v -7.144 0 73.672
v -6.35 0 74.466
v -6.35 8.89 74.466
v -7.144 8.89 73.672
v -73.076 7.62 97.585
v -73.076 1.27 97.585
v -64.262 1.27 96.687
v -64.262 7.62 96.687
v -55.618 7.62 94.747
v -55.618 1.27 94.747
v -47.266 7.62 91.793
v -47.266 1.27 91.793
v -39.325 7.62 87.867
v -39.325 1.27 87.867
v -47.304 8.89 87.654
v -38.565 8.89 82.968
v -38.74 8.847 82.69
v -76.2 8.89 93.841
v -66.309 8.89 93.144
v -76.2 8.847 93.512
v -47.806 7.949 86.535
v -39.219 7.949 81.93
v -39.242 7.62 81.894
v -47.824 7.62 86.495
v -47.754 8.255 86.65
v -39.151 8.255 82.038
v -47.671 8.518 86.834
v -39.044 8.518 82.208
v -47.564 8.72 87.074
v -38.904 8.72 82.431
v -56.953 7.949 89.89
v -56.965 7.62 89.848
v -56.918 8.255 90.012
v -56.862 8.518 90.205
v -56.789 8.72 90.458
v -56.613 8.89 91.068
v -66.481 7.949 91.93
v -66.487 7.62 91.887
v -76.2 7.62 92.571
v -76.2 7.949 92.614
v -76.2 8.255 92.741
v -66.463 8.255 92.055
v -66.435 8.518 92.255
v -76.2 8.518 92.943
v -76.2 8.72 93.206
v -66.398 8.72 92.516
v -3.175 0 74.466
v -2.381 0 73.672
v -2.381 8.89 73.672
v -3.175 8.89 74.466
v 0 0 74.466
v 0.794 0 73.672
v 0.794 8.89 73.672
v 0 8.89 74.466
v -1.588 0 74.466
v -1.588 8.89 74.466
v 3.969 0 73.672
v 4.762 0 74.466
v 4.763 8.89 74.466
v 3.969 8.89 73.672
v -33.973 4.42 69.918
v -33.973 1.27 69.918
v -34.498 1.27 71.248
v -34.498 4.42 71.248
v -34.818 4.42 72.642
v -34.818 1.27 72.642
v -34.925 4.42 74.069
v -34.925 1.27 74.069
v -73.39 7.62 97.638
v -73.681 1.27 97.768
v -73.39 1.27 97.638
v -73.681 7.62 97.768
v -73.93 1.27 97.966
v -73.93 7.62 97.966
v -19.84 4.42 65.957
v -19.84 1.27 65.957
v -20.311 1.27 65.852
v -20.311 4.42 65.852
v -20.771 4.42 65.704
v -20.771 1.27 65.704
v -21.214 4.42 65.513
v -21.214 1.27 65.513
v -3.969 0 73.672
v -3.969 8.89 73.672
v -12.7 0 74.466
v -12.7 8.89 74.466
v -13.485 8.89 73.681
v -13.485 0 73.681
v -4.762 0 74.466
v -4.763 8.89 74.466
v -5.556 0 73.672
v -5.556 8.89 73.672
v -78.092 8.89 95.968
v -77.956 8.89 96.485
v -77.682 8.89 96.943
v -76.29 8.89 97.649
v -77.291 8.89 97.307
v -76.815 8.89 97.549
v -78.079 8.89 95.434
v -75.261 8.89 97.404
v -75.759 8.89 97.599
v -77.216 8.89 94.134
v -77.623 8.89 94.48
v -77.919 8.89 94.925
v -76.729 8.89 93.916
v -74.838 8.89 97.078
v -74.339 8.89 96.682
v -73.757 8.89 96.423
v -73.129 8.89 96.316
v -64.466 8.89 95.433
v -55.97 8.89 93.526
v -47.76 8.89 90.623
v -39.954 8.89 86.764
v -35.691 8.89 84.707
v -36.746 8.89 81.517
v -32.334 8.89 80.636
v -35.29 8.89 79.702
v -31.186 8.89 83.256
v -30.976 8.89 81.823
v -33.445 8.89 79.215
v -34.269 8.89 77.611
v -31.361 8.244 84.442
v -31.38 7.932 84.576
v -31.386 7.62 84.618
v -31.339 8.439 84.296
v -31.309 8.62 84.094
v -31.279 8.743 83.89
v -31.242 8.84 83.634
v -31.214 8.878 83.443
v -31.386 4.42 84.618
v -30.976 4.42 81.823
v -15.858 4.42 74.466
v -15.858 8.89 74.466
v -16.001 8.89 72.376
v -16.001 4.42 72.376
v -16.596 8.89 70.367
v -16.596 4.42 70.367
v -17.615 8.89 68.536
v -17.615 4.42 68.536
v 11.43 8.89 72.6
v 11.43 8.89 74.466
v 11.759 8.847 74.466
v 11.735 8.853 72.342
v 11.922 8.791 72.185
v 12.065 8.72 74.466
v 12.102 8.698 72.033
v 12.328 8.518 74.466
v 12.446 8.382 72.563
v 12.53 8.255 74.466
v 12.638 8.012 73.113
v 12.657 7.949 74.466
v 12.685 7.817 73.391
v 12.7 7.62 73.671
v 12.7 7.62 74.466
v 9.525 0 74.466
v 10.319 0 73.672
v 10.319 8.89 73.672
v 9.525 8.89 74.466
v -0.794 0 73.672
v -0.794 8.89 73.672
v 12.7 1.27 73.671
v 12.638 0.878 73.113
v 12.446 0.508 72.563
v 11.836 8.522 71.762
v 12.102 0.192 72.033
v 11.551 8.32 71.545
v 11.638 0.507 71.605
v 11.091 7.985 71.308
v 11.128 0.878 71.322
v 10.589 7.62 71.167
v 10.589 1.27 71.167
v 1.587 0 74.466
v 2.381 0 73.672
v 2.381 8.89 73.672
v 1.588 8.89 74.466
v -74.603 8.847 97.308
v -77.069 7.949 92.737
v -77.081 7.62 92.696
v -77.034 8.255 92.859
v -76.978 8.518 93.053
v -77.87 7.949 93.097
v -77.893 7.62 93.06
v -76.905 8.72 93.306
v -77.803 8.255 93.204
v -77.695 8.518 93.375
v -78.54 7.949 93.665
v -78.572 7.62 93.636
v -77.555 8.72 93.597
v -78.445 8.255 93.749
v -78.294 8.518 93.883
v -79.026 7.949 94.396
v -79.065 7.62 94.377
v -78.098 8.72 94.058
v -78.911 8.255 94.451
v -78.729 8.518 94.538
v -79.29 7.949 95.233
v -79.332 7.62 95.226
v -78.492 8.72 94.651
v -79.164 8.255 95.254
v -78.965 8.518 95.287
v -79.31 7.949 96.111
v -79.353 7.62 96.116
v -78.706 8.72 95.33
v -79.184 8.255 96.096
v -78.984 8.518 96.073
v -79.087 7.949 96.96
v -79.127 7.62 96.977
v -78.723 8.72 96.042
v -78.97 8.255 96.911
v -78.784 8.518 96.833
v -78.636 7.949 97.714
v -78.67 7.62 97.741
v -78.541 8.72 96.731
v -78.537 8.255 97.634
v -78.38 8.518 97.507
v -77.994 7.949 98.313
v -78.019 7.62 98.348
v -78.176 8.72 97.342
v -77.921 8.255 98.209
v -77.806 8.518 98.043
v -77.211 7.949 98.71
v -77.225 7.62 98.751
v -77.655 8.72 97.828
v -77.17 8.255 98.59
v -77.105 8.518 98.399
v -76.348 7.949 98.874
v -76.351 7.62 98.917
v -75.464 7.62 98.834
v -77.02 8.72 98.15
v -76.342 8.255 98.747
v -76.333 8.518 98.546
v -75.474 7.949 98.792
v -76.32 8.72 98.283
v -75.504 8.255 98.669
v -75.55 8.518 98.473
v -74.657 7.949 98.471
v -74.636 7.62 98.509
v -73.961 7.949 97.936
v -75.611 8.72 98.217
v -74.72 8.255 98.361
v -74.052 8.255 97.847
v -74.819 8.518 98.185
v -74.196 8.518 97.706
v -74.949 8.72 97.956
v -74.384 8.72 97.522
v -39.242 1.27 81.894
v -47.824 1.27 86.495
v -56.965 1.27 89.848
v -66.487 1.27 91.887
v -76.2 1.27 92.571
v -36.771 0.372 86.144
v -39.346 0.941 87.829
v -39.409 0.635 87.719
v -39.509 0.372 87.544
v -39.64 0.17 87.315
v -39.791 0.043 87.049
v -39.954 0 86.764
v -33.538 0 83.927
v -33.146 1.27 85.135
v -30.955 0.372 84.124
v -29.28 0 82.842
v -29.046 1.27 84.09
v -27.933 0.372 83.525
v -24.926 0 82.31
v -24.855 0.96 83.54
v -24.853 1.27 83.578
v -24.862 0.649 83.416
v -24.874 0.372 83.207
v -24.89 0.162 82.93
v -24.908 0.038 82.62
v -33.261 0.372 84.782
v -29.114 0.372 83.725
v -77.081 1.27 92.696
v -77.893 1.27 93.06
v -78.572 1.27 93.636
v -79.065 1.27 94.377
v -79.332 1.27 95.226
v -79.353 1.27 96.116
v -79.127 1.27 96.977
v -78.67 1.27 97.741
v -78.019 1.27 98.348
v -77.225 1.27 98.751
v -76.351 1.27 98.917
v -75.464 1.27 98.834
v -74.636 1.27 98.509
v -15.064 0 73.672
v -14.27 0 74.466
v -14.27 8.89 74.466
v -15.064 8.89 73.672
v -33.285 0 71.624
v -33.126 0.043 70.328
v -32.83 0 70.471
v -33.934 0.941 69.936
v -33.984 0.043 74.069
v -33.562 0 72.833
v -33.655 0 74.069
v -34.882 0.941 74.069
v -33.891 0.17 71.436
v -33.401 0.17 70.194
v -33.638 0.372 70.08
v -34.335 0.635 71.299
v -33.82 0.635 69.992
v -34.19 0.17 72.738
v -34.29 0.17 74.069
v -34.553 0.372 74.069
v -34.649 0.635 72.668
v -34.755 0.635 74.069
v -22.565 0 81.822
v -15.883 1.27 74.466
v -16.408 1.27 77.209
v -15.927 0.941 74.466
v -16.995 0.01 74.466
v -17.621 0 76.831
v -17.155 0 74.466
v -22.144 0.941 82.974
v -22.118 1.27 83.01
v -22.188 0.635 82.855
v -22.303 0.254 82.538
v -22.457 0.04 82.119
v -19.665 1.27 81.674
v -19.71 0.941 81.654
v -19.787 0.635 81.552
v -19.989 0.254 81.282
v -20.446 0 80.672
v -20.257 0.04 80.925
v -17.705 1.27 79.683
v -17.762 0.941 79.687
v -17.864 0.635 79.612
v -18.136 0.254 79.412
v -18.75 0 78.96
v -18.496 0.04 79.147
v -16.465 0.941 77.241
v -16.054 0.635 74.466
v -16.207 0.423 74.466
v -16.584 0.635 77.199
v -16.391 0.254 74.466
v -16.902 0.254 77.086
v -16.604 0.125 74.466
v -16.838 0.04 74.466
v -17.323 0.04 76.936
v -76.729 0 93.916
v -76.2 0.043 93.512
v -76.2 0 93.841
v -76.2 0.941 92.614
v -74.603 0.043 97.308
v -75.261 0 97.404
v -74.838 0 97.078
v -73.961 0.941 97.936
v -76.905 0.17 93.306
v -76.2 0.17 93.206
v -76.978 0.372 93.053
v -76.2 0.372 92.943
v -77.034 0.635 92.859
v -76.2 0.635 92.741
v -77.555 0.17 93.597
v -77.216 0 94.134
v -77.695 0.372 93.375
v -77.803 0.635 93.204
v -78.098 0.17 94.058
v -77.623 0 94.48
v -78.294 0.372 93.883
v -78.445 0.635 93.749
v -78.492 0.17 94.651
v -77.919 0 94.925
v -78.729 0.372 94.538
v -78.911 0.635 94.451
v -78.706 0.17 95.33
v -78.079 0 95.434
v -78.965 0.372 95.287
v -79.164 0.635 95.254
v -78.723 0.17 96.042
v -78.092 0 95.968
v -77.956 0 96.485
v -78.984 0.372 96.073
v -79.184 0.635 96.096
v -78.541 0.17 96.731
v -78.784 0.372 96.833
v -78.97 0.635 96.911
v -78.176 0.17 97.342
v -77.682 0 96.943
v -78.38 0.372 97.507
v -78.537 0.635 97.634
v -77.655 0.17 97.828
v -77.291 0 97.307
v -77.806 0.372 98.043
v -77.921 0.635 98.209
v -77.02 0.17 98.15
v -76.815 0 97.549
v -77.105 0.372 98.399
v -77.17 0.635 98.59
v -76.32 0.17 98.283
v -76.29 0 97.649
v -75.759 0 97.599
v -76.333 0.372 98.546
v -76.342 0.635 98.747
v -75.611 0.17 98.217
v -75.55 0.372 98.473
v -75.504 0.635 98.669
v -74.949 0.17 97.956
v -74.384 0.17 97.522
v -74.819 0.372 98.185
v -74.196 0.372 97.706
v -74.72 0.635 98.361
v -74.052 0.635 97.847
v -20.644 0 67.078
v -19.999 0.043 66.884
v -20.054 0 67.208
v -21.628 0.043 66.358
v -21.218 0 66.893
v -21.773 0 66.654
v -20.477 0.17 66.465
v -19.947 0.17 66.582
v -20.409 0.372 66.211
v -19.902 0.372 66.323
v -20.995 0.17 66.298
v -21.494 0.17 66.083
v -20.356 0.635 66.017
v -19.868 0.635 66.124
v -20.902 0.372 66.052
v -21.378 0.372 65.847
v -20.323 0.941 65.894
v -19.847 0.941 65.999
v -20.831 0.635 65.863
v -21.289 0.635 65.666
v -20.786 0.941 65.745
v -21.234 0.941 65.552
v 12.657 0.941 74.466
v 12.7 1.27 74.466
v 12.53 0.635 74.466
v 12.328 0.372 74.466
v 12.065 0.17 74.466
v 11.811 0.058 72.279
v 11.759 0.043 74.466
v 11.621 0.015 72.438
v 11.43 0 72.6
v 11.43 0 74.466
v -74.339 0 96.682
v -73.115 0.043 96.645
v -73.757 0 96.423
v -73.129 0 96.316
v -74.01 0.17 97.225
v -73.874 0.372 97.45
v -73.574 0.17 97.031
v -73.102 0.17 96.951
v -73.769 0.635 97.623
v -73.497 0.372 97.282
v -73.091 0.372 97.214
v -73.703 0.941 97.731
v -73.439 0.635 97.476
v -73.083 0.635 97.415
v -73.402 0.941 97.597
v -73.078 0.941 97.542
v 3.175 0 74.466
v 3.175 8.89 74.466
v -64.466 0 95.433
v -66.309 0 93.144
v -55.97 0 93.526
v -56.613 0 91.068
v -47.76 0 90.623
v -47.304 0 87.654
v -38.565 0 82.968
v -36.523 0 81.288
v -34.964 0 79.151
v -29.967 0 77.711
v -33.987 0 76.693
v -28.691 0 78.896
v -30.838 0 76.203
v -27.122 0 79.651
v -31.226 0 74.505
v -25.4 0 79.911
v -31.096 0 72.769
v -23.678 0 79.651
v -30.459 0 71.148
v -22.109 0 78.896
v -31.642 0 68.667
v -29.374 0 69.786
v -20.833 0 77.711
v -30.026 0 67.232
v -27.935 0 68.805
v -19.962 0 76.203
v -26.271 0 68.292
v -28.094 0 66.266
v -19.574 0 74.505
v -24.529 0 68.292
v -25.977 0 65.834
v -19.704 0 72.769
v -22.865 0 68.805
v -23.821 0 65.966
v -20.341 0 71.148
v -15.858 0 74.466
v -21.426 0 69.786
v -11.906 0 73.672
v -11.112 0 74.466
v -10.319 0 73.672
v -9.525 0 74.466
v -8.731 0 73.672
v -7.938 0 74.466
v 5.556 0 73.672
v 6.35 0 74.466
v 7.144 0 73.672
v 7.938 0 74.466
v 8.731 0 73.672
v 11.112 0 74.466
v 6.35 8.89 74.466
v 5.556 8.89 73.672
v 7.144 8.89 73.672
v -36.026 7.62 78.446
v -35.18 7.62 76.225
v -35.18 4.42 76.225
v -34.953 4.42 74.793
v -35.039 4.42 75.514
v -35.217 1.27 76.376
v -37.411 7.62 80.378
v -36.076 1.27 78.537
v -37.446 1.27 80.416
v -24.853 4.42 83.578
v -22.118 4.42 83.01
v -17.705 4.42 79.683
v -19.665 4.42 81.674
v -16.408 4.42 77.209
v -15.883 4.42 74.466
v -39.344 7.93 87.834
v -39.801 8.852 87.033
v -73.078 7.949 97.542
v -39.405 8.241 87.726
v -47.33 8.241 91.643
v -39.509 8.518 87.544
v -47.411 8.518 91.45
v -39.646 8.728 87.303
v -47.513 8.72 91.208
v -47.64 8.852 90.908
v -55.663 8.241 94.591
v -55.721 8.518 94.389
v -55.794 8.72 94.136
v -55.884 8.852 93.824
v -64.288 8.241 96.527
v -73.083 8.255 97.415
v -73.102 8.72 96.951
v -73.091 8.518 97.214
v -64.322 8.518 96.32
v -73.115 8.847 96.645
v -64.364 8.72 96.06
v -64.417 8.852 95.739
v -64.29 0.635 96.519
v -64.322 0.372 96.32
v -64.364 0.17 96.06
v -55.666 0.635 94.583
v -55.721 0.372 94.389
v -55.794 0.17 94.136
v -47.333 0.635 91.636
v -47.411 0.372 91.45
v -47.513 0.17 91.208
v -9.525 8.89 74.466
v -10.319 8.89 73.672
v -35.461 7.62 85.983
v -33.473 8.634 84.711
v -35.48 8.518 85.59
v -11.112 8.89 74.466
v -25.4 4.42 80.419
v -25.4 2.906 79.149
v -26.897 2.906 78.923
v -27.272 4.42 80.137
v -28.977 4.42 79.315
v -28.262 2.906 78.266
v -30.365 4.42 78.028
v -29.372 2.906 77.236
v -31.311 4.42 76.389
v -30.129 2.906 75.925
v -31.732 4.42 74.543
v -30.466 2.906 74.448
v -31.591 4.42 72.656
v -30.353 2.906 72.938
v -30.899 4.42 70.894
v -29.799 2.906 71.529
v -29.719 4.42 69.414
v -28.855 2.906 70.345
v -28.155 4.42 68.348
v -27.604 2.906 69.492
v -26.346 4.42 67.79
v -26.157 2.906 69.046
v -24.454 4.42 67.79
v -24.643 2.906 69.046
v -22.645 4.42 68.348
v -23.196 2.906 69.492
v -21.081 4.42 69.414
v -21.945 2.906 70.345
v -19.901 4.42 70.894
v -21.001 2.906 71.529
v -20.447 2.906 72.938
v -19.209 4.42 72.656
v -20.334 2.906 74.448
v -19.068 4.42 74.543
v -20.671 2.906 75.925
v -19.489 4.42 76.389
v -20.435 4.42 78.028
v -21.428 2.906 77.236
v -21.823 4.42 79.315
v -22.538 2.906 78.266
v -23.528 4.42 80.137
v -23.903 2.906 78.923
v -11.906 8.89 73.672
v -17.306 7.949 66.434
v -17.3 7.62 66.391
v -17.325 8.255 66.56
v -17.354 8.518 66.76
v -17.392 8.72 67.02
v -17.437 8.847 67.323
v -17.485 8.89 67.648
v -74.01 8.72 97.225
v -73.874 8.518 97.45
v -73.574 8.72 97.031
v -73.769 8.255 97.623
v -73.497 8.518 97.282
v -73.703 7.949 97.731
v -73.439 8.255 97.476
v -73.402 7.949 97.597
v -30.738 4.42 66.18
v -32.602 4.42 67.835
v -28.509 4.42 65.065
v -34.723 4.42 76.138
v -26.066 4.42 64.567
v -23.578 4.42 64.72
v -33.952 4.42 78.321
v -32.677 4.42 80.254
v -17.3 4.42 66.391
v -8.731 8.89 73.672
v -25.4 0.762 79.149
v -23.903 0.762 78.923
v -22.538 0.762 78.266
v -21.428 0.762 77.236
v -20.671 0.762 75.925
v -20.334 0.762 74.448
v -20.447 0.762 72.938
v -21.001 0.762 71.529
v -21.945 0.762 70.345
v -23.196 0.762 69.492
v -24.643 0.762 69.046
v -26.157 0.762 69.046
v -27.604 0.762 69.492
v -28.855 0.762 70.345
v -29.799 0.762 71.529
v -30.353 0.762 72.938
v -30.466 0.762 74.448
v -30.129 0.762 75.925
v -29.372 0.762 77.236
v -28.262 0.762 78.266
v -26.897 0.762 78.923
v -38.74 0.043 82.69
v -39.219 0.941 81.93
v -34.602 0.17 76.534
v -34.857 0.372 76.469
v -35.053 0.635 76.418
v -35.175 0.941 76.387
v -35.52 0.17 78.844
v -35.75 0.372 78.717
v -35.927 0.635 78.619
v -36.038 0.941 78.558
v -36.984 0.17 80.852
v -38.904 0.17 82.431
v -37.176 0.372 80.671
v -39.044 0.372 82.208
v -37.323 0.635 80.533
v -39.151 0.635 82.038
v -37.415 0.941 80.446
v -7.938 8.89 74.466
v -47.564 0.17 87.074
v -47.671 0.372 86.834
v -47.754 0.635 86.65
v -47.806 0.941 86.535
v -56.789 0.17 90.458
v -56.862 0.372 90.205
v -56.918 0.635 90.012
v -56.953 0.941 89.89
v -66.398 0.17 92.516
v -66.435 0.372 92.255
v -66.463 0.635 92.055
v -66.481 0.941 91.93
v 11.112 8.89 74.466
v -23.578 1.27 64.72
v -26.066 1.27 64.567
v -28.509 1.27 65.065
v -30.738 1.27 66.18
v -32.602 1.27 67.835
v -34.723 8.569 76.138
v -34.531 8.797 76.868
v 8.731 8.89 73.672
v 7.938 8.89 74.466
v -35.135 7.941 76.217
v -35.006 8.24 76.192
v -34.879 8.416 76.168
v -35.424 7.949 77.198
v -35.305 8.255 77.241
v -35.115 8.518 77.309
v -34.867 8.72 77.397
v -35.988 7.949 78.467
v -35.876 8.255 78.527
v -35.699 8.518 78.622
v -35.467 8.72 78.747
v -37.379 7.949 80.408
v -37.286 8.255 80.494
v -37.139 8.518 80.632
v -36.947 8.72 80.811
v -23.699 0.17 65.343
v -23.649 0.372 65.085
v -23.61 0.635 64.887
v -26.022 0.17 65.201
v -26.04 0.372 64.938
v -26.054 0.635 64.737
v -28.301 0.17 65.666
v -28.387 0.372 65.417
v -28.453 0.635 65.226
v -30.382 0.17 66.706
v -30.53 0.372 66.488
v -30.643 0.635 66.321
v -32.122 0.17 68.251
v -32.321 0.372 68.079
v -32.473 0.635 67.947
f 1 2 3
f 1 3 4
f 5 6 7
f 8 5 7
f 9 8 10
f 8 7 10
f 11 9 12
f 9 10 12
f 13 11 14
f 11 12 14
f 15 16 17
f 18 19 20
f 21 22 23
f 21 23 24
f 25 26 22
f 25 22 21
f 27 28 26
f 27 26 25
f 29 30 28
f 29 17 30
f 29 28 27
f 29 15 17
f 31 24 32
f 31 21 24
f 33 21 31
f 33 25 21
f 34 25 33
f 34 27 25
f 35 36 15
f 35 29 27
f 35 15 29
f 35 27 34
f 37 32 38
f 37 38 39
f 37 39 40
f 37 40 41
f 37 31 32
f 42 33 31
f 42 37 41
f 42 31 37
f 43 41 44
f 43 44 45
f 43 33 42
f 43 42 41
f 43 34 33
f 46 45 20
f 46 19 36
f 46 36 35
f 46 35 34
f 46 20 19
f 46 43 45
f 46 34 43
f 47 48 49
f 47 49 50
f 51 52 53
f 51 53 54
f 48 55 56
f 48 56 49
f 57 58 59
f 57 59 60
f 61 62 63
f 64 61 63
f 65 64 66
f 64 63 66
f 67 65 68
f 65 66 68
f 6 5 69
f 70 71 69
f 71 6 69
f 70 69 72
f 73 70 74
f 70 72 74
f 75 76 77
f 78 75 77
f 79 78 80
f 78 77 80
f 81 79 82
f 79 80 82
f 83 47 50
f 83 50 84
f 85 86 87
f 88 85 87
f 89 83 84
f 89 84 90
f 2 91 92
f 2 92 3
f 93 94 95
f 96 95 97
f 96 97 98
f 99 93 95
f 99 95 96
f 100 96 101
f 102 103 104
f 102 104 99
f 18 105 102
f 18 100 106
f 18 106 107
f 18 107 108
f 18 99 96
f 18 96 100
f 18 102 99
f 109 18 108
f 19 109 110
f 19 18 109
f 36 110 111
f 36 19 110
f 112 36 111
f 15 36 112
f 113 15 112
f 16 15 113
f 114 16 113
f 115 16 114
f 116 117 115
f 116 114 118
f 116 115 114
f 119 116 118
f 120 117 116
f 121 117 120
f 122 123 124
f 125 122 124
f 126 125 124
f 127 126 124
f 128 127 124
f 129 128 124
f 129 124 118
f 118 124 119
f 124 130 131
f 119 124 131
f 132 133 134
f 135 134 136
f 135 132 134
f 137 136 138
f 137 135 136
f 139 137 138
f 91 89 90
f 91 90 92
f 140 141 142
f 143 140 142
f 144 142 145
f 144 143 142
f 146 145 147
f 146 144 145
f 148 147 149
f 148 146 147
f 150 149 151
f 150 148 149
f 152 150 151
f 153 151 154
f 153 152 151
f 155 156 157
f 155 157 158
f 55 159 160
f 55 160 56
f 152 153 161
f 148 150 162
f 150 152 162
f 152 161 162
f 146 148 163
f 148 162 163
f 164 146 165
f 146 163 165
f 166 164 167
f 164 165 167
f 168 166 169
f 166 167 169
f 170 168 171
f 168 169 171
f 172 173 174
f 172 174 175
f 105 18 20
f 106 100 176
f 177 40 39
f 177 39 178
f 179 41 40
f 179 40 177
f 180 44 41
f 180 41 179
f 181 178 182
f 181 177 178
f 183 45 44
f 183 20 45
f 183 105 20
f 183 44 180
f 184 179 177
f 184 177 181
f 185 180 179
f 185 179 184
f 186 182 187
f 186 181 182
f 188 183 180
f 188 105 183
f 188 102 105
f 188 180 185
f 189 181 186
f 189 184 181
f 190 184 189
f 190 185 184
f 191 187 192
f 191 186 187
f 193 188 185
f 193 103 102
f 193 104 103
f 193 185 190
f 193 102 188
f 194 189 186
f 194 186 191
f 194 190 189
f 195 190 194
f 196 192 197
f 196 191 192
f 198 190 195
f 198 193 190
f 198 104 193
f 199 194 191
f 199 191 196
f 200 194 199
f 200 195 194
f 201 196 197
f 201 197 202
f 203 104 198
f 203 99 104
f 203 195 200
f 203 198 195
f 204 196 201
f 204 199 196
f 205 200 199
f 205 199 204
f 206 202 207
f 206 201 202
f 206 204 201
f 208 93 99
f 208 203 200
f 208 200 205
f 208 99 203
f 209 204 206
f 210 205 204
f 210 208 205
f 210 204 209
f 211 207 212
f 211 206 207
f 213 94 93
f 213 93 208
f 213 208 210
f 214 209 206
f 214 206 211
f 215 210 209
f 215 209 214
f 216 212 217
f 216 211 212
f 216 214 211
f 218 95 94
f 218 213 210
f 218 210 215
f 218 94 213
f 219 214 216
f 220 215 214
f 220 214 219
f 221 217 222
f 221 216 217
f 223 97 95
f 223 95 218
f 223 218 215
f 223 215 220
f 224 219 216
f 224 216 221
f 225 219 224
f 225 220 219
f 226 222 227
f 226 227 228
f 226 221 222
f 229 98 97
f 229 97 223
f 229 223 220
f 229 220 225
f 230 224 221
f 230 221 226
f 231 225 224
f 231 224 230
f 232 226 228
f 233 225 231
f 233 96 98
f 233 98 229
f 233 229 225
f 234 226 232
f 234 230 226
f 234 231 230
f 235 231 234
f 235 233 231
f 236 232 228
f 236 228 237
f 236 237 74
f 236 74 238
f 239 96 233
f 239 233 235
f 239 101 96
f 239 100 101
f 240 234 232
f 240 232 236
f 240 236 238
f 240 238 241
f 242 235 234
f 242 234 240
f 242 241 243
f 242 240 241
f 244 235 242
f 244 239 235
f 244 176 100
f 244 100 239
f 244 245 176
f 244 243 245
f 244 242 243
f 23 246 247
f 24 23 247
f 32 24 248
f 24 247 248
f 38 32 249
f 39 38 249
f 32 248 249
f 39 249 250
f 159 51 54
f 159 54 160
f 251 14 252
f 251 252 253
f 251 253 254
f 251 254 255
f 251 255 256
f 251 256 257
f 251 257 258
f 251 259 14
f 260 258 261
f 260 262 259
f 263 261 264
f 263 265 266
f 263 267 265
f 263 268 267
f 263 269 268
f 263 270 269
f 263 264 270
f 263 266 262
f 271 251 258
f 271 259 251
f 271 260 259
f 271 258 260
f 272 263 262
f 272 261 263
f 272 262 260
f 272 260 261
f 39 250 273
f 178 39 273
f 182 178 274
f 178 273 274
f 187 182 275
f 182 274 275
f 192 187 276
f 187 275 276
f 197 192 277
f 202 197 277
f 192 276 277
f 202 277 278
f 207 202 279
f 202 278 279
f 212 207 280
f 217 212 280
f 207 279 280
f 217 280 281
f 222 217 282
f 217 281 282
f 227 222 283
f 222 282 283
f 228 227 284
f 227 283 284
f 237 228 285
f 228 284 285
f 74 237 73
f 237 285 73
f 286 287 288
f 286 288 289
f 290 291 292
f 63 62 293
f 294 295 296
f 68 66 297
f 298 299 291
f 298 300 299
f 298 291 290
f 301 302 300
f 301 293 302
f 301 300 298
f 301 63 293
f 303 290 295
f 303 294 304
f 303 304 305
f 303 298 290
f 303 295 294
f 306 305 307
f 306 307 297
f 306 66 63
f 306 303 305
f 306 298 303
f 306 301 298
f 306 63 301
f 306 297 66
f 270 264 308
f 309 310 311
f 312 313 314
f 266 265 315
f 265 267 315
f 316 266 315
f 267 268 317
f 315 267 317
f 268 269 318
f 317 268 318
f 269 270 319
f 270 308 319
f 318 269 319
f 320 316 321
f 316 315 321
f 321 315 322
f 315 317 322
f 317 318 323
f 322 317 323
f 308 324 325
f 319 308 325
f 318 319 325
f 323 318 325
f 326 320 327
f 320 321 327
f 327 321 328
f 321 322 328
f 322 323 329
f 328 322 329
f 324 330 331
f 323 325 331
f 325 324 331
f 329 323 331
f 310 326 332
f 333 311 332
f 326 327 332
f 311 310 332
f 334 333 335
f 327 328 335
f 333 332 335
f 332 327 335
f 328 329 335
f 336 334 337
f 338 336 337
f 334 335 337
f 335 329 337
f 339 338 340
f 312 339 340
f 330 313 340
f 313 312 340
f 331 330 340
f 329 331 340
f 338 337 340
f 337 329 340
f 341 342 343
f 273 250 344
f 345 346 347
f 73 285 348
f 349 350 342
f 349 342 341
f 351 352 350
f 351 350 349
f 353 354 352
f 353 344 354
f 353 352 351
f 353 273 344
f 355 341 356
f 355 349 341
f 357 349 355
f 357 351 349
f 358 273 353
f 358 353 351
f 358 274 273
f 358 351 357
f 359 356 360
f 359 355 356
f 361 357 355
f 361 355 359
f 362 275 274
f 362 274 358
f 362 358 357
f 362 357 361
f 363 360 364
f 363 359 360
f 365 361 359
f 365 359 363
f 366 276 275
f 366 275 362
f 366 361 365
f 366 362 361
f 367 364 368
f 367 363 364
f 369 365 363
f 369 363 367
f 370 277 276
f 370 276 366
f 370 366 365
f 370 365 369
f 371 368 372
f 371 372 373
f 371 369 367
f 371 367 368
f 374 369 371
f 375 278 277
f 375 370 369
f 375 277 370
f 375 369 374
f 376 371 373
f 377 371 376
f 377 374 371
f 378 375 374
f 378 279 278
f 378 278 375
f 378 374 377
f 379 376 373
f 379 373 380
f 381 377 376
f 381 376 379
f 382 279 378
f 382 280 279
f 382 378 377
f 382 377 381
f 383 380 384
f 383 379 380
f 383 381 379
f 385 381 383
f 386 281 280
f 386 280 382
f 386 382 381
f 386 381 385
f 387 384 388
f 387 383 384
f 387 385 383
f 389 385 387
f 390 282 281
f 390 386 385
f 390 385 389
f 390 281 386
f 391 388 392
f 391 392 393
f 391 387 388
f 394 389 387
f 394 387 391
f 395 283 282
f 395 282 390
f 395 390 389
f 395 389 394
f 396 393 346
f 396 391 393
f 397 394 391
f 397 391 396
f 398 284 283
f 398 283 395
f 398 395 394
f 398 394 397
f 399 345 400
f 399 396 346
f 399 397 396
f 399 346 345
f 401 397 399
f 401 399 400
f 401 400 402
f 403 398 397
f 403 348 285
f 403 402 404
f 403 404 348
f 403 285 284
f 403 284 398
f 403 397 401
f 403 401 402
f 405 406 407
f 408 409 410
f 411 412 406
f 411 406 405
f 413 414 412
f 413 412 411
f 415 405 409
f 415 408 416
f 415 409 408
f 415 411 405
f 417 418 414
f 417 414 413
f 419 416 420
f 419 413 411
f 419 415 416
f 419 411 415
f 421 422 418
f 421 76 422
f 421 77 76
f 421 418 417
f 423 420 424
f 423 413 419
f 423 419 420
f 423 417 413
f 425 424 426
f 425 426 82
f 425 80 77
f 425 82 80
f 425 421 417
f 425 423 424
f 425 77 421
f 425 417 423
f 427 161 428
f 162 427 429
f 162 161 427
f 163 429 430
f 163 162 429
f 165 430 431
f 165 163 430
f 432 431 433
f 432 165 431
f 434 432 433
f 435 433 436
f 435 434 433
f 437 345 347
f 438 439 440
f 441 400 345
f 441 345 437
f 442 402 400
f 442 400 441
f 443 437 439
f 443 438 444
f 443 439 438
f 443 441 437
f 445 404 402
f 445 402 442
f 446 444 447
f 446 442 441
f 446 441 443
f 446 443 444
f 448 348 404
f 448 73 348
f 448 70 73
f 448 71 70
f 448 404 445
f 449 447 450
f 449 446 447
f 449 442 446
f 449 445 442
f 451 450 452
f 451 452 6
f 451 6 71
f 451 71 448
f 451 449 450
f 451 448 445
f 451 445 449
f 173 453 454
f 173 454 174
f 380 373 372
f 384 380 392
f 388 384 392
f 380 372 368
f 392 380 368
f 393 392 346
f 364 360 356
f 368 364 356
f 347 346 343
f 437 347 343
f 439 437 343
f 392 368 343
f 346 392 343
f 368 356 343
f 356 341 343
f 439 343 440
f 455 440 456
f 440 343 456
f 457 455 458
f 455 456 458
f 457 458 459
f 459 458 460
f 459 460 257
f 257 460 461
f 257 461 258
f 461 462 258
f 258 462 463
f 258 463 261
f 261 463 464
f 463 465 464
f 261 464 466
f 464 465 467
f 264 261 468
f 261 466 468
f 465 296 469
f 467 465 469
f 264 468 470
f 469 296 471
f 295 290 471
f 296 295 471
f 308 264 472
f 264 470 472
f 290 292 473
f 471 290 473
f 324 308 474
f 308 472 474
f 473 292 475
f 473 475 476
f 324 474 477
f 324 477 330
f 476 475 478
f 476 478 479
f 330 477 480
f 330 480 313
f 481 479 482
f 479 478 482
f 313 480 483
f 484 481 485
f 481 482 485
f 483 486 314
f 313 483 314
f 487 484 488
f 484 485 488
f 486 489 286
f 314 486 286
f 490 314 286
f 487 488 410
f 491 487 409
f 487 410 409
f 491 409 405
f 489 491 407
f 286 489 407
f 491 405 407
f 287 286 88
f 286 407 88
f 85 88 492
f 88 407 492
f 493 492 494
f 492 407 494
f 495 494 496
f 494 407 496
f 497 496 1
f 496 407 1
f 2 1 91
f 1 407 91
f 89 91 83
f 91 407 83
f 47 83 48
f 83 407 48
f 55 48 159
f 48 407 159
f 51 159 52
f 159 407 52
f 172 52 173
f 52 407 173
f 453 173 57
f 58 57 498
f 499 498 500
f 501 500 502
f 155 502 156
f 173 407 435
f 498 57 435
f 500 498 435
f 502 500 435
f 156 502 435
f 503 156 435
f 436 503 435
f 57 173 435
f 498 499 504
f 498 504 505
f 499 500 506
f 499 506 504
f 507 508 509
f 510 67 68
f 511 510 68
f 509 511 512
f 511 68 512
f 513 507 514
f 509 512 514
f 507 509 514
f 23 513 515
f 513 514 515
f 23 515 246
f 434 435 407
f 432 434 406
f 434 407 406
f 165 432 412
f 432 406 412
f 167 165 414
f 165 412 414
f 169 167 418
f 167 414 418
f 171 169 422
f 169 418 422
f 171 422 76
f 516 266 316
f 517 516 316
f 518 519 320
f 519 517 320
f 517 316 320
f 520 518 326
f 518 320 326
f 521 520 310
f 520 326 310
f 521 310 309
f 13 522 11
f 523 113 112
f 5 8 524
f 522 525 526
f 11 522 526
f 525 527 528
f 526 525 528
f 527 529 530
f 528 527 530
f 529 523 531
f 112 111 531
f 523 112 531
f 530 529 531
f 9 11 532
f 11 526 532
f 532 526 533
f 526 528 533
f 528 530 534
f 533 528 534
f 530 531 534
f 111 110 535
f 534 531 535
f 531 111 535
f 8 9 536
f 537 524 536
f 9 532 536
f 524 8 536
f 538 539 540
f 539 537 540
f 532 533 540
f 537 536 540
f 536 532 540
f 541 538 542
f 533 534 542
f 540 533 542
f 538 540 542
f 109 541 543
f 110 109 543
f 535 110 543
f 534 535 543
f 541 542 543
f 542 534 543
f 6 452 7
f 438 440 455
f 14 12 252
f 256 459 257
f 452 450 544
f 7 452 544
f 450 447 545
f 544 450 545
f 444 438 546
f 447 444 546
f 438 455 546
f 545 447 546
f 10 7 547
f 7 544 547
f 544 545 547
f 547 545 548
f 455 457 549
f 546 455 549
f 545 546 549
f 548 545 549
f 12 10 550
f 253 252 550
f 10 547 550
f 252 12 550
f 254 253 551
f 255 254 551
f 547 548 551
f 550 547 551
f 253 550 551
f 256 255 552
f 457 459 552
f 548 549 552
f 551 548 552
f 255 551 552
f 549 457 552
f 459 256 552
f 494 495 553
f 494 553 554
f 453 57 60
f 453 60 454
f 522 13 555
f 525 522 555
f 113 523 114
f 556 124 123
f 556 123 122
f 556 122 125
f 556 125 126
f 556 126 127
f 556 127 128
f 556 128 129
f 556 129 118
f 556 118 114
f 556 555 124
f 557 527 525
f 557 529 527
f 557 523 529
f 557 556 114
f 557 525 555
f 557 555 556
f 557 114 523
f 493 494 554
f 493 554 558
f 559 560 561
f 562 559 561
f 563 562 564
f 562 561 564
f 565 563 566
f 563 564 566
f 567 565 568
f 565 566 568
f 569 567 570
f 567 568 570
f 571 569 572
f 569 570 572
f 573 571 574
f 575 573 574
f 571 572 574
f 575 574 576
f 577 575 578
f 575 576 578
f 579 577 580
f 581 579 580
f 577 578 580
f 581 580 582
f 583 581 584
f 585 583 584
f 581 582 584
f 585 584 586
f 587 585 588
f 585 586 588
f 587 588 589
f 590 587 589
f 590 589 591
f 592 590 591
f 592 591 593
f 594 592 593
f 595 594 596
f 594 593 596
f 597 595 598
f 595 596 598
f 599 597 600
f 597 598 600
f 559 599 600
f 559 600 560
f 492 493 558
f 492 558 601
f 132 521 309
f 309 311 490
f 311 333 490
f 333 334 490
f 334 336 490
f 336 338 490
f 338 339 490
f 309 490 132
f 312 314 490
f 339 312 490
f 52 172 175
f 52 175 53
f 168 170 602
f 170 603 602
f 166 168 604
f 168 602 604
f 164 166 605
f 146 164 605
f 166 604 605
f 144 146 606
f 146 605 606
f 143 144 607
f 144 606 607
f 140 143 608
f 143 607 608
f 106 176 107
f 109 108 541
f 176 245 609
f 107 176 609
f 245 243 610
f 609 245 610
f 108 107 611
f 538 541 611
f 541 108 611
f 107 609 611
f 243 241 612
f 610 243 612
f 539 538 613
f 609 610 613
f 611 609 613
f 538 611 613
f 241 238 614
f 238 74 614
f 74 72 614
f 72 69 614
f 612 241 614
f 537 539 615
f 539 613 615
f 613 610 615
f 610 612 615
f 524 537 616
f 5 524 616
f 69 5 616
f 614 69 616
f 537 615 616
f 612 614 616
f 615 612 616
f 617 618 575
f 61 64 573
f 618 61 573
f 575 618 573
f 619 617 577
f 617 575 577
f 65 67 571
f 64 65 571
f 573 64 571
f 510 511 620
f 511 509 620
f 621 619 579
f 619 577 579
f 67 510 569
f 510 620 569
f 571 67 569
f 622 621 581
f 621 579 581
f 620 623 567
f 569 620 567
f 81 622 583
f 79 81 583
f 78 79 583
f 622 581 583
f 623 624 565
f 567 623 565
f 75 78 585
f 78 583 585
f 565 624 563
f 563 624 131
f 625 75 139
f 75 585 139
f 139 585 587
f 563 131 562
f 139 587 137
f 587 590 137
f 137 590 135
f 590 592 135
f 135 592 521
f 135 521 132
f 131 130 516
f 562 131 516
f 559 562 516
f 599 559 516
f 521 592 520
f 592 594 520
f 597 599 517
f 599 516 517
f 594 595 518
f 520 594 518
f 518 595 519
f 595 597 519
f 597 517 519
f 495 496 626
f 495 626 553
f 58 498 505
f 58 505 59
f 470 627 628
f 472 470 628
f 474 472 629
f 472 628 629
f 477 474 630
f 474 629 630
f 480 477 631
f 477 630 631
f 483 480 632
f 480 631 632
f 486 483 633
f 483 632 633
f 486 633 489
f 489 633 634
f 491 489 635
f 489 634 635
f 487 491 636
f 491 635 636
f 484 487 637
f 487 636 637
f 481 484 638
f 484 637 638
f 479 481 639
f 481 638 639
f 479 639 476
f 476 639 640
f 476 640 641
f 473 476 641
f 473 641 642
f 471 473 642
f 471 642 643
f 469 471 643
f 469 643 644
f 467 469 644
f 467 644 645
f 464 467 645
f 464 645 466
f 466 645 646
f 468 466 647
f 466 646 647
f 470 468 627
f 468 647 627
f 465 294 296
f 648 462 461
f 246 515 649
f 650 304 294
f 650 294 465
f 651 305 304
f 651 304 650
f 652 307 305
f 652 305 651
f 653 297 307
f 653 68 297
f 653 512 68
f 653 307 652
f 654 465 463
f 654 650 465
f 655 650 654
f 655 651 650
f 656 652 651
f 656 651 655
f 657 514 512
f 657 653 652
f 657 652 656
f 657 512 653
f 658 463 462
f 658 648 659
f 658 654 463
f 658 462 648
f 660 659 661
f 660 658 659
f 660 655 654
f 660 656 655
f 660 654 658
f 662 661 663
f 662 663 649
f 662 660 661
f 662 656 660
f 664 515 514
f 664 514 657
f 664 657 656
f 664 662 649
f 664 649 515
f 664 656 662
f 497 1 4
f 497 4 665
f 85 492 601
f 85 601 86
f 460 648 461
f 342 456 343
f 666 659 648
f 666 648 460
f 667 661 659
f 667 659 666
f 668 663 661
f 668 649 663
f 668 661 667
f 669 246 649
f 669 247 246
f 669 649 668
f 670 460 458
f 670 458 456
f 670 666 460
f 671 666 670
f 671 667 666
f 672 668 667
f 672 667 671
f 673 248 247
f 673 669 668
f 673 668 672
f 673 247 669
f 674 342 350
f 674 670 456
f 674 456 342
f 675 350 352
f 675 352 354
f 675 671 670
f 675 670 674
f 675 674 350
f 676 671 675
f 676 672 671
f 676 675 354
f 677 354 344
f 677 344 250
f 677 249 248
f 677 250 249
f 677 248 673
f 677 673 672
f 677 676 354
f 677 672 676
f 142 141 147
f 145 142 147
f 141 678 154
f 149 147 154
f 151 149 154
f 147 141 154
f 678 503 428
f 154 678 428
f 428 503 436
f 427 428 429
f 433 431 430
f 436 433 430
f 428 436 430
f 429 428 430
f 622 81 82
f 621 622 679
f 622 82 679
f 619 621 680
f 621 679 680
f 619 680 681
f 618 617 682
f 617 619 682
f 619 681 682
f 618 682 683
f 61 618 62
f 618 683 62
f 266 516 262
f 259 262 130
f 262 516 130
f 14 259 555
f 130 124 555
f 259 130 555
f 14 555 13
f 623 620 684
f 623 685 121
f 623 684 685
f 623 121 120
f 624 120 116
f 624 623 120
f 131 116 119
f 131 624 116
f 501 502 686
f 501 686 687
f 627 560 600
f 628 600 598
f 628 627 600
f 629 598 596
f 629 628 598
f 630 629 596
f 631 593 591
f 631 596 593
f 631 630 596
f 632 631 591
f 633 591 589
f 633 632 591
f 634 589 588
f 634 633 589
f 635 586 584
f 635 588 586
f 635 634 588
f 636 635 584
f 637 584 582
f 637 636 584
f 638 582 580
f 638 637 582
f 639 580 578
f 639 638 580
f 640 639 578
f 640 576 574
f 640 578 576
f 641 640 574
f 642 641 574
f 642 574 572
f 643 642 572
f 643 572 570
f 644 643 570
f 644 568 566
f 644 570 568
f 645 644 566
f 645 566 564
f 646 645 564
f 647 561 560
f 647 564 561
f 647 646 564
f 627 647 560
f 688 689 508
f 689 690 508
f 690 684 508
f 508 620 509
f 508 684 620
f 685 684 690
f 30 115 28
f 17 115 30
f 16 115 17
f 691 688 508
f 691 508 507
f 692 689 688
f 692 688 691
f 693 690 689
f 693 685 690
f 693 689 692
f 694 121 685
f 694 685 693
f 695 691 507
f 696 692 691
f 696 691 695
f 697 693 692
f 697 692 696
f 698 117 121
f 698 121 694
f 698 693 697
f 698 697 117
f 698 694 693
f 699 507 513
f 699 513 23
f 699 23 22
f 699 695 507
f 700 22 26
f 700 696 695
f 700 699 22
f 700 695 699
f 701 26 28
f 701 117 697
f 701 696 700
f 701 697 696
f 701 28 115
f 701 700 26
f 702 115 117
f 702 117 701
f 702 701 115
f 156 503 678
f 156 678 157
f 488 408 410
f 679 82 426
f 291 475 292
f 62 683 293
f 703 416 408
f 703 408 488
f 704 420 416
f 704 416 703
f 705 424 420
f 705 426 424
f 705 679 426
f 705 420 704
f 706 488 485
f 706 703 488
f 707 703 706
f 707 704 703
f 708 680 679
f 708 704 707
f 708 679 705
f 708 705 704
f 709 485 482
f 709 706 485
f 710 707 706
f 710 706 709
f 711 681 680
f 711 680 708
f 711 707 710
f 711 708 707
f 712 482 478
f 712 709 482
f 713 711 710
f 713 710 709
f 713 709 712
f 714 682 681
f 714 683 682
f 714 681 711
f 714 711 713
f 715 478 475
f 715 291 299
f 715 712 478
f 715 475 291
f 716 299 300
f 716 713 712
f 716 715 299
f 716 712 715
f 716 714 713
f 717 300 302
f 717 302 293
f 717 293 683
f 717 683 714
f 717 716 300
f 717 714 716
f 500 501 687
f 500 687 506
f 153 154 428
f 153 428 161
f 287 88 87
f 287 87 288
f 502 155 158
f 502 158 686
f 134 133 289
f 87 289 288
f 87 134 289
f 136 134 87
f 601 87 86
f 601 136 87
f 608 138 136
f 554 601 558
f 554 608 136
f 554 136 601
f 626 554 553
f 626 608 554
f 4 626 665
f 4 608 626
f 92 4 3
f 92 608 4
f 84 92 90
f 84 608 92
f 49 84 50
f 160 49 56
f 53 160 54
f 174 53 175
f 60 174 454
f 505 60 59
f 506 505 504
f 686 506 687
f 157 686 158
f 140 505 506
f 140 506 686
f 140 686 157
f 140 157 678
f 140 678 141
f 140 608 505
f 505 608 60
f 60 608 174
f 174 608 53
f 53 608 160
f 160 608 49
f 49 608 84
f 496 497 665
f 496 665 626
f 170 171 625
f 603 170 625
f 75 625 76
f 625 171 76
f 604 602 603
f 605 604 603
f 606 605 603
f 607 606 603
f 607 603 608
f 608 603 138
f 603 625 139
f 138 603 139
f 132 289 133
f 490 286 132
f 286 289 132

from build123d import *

# Parameters (mm, degrees)
SKETCH1_R               = 5.08
EXTRUDE1_DEPTH          = 8.89
FILLET3_R               = 33.02
CUT_EXTRUDE1_START      = -4.4704
CUT_EXTRUDE1_DEPTH      = 4.4704
FILLET4_R               = 1.27
FILLET7_R               = 1.27
FILLET8_R               = 2.54
CUT_EXTRUDE4_START      = -2.4323391
CUT_EXTRUDE4_DEPTH      = 2.4323391
SKETCH7_R               = 9.5504
CUT_EXTRUDE5_DEPTH      = 127.908284031
CHAMFER1_SIZE           = 0.762
CHAMFER2_SIZE           = 1.27
CHAMFER2_SIZE2          = 1.513527063
CUT_EXTRUDE7_DEPTH      = 128.140710162
CUT_EXTRUDE7_DEPTH_BACK = 128.140710162


# Read off the part's stored shape, not the designer's step: Cut-Extrude4
with BuildPart() as part:
    # Sketch1 → Extrude1 (new body)
    with BuildSketch(Plane(origin=(0, 0, 0), x_dir=(1, 0, 0), z_dir=(0, 1, 0))):
        with BuildLine():
            Line((12.7, -74.068815454), (12.7, -71.528815454))
            Line((12.7, -71.528815454), (-19.839666339, -65.95654879))
            ThreePointArc((-19.839666339, -65.95654879), (-20.542938147, -65.783746069), (-21.214492201, -65.512697791))
            ThreePointArc((-21.214492201, -65.512697791), (-28.50851165, -65.065328333), (-33.972800967, -69.917585685))
            ThreePointArc((-33.972800967, -69.917585685), (-34.683898809, -71.939297222), (-34.925, -74.068815454))
            ThreePointArc((-34.925, -74.068815454), (-36.075887863, -78.537283812), (-39.242168201, -81.893832809))
            ThreePointArc((-39.242168201, -81.893832809), (-56.965393588, -89.848120853), (-76.2, -92.570864422))
            ThreePointArc((-76.2, -92.570864422), (-79.027338631, -97.190434), (-73.627220553, -97.606356539))
            ThreePointArc((-73.627220553, -97.606356539), (-50.892740286, -93.213306405), (-30.610706836, -82.042155988))
            ThreePointArc((-30.610706836, -82.042155988), (-21.042688621, -82.538730598), (-15.883271821, -74.465690454))
            Line((-15.883271821, -74.465690454), (12.7, -74.465690454))
            Line((12.7, -74.465690454), (12.7, -74.068815454))
        make_face()
        with Locations(Location((-25.4, -74.068815454, 0), (0, 0, 270))):
            Circle(SKETCH1_R, mode=Mode.SUBTRACT)
    extrude(amount=EXTRUDE1_DEPTH)

    # Fillet3
    fillet3_edges = [part.edges().sort_by_distance(p)[0] for p in [
        (-30.610706836, 4.445, 82.042155988),
    ]]
    fillet(fillet3_edges, radius=FILLET3_R)

    # Sketch4 → Cut-Extrude1 (cut)
    with BuildSketch(Plane(origin=(0, 8.89, 0), x_dir=(-1, 0, 0), z_dir=(0, 1, 0)).offset(CUT_EXTRUDE1_START)):
        with BuildLine():
            Line((17.299976936, 66.391458799), (17.620638494, 68.572711419))
            ThreePointArc((17.620638494, 68.572711419), (16.819560669, 78.20423392), (24.852605063, 83.578073247))
            Line((24.852605063, 83.578073247), (24.852605063, 89.837842614))
            Line((24.852605063, 89.837842614), (32.15380679, 89.837842614))
            Line((32.15380679, 89.837842614), (30.971364696, 81.794455907))
            ThreePointArc((30.971364696, 81.794455907), (33.355442096, 79.306808013), (34.698482461, 76.13372439))
            Line((34.698482461, 76.13372439), (35.179826108, 76.225066607))
            Line((35.179826108, 76.225066607), (37.134154695, 72.138642589))
            Line((37.134154695, 72.138642589), (28.798402731, 58.612170247))
            Line((28.798402731, 58.612170247), (17.299976936, 66.391458799))
        make_face()
    extrude(amount=CUT_EXTRUDE1_DEPTH, mode=Mode.SUBTRACT)

    # Fillet4
    fillet4_edges = [part.edges().sort_by_distance(p)[0] for p in [
        (-56.965393588, 8.89, 89.848120853),
        (-56.965393588, 0, 89.848120853),
        (-79.027338631, 8.89, 97.190434),
        (-79.027338631, 0, 97.190434),
        (-35.461557578, 8.89, 85.983630351),
        (-18.611736336, 0, 80.750514447),
        (-32.337042326, 0, 84.884424071),
        (-73.627220553, 4.445, 97.606356539),
        (-55.883733715, 8.89, 94.822561219),
        (-55.883733715, 0, 94.822561219),
        (-3.569833169, 0, 68.742682122),
        (-30.442750401, 0, 65.988203262),
        (-36.656296279, 8.89, 79.456958555),
        (-36.075887863, 0, 78.537283812),
        (-20.542938147, 0, 65.783746069),
    ]]
    fillet(fillet4_edges, radius=FILLET4_R)

    # Fillet7
    fillet7_edges = [part.edges().sort_by_distance(p)[0] for p in [
        (-2.299988468, 8.89, 68.960137126),
    ]]
    fillet(fillet7_edges, radius=FILLET7_R)

    # Fillet8
    # the kernel refuses this fillet: 2.54 mm, written as the material it takes off along each edge
    with BuildSketch(Plane(origin=(12.7, -4.085026029, 71.528815454), x_dir=(-0.9856523135338612, 0, -0.1687883788219644), z_dir=(0, 1, 0))) as fillet8_piece_1:
        with BuildLine():
            CenterArc((FILLET8_R * 0.843311185663, FILLET8_R), FILLET8_R, 189.717380318, 80.282619682)
            Line((-FILLET8_R * 0.142341127871, FILLET8_R * 0.831211621178), (0, 0))
            Line((0, 0), (FILLET8_R * 0.843311185663, 0))
        make_face()
    extrude(amount=17.060052058, mode=Mode.SUBTRACT)

    # Cut-Extrude4 outline → Cut-Extrude4 (cut)
    with BuildSketch(Plane.XY.offset(74.465690454).offset(CUT_EXTRUDE4_START)):
        with BuildLine():
            Line((12.7, 0), (12.7, 1.27))
            ThreePointArc((12.7, 1.27), (12.328025612, 0.371974388), (11.43, 0))
            Line((11.43, 0), (12.7, 0))
        make_face()
        with BuildLine():
            ThreePointArc((11.43, 8.89), (12.328025612, 8.518025612), (12.7, 7.62))
            Line((12.7, 7.62), (12.7, 8.89))
            Line((12.7, 8.89), (11.43, 8.89))
        make_face()
    extrude(amount=CUT_EXTRUDE4_DEPTH, mode=Mode.SUBTRACT)

    # Sketch7 → Cut-Extrude5 (cut, through all)
    with BuildSketch(Plane(origin=(0, 4.4196, 0), x_dir=(-1, 0, 0), z_dir=(0, 1, 0))):
        with Locations((25.4, 74.068815454)):
            Circle(SKETCH7_R)
    extrude(amount=CUT_EXTRUDE5_DEPTH, mode=Mode.SUBTRACT)

    # Chamfer1
    chamfer1_edges = [part.edges().sort_by_distance(p)[0] for p in [
        (-25.4, 0, 68.988815454),
    ]]
    chamfer(chamfer1_edges, length=CHAMFER1_SIZE)

    # Chamfer2
    chamfer2_edges = [part.edges().sort_by_distance(p)[0] for p in [
        (-25.4, 4.4196, 68.988815454),
    ]]
    chamfer2_side = [part.faces().sort_by_distance(p)[0] for p in [
        (-18.616859876, 4.4196, 66.448687097),
    ]]
    chamfer(chamfer2_edges, length=CHAMFER2_SIZE, length2=CHAMFER2_SIZE2, reference=chamfer2_side[0])

    # Sketch9 → Cut-Extrude7 (cut, two sides: drawn at the far end of the back side and taken through both)
    with BuildSketch(Plane(origin=(0, 8.89, 0), x_dir=(-1, 0, 0), z_dir=(0, 1, 0)).offset(-CUT_EXTRUDE7_DEPTH_BACK)):
        Polygon((0.79375, 73.671940454), (1.5875, 74.465690454), (0, 74.465690454), align=None)
        Polygon((2.38125, 73.671940454), (3.175, 74.465690454), (1.5875, 74.465690454), align=None)
        Polygon((3.96875, 73.671940454), (4.7625, 74.465690454), (3.175, 74.465690454), align=None)
        Polygon((11.90625, 73.671940454), (12.7, 74.465690454), (11.1125, 74.465690454), align=None)
        Polygon((13.485174901, 73.680515552), (14.270349802, 74.465690454), (12.7, 74.465690454), align=None)
        Polygon((10.31875, 73.671940454), (11.1125, 74.465690454), (9.525, 74.465690454), align=None)
        Polygon((8.73125, 73.671940454), (9.525, 74.465690454), (7.9375, 74.465690454), align=None)
        Polygon((7.14375, 73.671940454), (7.9375, 74.465690454), (6.35, 74.465690454), align=None)
        Polygon((5.55625, 73.671940454), (6.35, 74.465690454), (4.7625, 74.465690454), align=None)
        Polygon((15.064099802, 73.671940454), (15.857849802, 74.465690454), (14.270349802, 74.465690454), align=None)
        Polygon((-0.79375, 73.671940454), (0, 74.465690454), (-1.5875, 74.465690454), align=None)
        Polygon((-2.38125, 73.671940454), (-1.5875, 74.465690454), (-3.175, 74.465690454), align=None)
        Polygon((-3.96875, 73.671940454), (-3.175, 74.465690454), (-4.7625, 74.465690454), align=None)
        Polygon((-5.55625, 73.671940454), (-4.7625, 74.465690454), (-6.35, 74.465690454), align=None)
        Polygon((-7.14375, 73.671940454), (-6.35, 74.465690454), (-7.9375, 74.465690454), align=None)
        Polygon((-8.73125, 73.671940454), (-7.9375, 74.465690454), (-9.525, 74.465690454), align=None)
        Polygon((-10.31875, 73.671940454), (-9.525, 74.465690454), (-11.1125, 74.465690454), align=None)
    extrude(amount=CUT_EXTRUDE7_DEPTH + CUT_EXTRUDE7_DEPTH_BACK, mode=Mode.SUBTRACT)


solid = part.part
